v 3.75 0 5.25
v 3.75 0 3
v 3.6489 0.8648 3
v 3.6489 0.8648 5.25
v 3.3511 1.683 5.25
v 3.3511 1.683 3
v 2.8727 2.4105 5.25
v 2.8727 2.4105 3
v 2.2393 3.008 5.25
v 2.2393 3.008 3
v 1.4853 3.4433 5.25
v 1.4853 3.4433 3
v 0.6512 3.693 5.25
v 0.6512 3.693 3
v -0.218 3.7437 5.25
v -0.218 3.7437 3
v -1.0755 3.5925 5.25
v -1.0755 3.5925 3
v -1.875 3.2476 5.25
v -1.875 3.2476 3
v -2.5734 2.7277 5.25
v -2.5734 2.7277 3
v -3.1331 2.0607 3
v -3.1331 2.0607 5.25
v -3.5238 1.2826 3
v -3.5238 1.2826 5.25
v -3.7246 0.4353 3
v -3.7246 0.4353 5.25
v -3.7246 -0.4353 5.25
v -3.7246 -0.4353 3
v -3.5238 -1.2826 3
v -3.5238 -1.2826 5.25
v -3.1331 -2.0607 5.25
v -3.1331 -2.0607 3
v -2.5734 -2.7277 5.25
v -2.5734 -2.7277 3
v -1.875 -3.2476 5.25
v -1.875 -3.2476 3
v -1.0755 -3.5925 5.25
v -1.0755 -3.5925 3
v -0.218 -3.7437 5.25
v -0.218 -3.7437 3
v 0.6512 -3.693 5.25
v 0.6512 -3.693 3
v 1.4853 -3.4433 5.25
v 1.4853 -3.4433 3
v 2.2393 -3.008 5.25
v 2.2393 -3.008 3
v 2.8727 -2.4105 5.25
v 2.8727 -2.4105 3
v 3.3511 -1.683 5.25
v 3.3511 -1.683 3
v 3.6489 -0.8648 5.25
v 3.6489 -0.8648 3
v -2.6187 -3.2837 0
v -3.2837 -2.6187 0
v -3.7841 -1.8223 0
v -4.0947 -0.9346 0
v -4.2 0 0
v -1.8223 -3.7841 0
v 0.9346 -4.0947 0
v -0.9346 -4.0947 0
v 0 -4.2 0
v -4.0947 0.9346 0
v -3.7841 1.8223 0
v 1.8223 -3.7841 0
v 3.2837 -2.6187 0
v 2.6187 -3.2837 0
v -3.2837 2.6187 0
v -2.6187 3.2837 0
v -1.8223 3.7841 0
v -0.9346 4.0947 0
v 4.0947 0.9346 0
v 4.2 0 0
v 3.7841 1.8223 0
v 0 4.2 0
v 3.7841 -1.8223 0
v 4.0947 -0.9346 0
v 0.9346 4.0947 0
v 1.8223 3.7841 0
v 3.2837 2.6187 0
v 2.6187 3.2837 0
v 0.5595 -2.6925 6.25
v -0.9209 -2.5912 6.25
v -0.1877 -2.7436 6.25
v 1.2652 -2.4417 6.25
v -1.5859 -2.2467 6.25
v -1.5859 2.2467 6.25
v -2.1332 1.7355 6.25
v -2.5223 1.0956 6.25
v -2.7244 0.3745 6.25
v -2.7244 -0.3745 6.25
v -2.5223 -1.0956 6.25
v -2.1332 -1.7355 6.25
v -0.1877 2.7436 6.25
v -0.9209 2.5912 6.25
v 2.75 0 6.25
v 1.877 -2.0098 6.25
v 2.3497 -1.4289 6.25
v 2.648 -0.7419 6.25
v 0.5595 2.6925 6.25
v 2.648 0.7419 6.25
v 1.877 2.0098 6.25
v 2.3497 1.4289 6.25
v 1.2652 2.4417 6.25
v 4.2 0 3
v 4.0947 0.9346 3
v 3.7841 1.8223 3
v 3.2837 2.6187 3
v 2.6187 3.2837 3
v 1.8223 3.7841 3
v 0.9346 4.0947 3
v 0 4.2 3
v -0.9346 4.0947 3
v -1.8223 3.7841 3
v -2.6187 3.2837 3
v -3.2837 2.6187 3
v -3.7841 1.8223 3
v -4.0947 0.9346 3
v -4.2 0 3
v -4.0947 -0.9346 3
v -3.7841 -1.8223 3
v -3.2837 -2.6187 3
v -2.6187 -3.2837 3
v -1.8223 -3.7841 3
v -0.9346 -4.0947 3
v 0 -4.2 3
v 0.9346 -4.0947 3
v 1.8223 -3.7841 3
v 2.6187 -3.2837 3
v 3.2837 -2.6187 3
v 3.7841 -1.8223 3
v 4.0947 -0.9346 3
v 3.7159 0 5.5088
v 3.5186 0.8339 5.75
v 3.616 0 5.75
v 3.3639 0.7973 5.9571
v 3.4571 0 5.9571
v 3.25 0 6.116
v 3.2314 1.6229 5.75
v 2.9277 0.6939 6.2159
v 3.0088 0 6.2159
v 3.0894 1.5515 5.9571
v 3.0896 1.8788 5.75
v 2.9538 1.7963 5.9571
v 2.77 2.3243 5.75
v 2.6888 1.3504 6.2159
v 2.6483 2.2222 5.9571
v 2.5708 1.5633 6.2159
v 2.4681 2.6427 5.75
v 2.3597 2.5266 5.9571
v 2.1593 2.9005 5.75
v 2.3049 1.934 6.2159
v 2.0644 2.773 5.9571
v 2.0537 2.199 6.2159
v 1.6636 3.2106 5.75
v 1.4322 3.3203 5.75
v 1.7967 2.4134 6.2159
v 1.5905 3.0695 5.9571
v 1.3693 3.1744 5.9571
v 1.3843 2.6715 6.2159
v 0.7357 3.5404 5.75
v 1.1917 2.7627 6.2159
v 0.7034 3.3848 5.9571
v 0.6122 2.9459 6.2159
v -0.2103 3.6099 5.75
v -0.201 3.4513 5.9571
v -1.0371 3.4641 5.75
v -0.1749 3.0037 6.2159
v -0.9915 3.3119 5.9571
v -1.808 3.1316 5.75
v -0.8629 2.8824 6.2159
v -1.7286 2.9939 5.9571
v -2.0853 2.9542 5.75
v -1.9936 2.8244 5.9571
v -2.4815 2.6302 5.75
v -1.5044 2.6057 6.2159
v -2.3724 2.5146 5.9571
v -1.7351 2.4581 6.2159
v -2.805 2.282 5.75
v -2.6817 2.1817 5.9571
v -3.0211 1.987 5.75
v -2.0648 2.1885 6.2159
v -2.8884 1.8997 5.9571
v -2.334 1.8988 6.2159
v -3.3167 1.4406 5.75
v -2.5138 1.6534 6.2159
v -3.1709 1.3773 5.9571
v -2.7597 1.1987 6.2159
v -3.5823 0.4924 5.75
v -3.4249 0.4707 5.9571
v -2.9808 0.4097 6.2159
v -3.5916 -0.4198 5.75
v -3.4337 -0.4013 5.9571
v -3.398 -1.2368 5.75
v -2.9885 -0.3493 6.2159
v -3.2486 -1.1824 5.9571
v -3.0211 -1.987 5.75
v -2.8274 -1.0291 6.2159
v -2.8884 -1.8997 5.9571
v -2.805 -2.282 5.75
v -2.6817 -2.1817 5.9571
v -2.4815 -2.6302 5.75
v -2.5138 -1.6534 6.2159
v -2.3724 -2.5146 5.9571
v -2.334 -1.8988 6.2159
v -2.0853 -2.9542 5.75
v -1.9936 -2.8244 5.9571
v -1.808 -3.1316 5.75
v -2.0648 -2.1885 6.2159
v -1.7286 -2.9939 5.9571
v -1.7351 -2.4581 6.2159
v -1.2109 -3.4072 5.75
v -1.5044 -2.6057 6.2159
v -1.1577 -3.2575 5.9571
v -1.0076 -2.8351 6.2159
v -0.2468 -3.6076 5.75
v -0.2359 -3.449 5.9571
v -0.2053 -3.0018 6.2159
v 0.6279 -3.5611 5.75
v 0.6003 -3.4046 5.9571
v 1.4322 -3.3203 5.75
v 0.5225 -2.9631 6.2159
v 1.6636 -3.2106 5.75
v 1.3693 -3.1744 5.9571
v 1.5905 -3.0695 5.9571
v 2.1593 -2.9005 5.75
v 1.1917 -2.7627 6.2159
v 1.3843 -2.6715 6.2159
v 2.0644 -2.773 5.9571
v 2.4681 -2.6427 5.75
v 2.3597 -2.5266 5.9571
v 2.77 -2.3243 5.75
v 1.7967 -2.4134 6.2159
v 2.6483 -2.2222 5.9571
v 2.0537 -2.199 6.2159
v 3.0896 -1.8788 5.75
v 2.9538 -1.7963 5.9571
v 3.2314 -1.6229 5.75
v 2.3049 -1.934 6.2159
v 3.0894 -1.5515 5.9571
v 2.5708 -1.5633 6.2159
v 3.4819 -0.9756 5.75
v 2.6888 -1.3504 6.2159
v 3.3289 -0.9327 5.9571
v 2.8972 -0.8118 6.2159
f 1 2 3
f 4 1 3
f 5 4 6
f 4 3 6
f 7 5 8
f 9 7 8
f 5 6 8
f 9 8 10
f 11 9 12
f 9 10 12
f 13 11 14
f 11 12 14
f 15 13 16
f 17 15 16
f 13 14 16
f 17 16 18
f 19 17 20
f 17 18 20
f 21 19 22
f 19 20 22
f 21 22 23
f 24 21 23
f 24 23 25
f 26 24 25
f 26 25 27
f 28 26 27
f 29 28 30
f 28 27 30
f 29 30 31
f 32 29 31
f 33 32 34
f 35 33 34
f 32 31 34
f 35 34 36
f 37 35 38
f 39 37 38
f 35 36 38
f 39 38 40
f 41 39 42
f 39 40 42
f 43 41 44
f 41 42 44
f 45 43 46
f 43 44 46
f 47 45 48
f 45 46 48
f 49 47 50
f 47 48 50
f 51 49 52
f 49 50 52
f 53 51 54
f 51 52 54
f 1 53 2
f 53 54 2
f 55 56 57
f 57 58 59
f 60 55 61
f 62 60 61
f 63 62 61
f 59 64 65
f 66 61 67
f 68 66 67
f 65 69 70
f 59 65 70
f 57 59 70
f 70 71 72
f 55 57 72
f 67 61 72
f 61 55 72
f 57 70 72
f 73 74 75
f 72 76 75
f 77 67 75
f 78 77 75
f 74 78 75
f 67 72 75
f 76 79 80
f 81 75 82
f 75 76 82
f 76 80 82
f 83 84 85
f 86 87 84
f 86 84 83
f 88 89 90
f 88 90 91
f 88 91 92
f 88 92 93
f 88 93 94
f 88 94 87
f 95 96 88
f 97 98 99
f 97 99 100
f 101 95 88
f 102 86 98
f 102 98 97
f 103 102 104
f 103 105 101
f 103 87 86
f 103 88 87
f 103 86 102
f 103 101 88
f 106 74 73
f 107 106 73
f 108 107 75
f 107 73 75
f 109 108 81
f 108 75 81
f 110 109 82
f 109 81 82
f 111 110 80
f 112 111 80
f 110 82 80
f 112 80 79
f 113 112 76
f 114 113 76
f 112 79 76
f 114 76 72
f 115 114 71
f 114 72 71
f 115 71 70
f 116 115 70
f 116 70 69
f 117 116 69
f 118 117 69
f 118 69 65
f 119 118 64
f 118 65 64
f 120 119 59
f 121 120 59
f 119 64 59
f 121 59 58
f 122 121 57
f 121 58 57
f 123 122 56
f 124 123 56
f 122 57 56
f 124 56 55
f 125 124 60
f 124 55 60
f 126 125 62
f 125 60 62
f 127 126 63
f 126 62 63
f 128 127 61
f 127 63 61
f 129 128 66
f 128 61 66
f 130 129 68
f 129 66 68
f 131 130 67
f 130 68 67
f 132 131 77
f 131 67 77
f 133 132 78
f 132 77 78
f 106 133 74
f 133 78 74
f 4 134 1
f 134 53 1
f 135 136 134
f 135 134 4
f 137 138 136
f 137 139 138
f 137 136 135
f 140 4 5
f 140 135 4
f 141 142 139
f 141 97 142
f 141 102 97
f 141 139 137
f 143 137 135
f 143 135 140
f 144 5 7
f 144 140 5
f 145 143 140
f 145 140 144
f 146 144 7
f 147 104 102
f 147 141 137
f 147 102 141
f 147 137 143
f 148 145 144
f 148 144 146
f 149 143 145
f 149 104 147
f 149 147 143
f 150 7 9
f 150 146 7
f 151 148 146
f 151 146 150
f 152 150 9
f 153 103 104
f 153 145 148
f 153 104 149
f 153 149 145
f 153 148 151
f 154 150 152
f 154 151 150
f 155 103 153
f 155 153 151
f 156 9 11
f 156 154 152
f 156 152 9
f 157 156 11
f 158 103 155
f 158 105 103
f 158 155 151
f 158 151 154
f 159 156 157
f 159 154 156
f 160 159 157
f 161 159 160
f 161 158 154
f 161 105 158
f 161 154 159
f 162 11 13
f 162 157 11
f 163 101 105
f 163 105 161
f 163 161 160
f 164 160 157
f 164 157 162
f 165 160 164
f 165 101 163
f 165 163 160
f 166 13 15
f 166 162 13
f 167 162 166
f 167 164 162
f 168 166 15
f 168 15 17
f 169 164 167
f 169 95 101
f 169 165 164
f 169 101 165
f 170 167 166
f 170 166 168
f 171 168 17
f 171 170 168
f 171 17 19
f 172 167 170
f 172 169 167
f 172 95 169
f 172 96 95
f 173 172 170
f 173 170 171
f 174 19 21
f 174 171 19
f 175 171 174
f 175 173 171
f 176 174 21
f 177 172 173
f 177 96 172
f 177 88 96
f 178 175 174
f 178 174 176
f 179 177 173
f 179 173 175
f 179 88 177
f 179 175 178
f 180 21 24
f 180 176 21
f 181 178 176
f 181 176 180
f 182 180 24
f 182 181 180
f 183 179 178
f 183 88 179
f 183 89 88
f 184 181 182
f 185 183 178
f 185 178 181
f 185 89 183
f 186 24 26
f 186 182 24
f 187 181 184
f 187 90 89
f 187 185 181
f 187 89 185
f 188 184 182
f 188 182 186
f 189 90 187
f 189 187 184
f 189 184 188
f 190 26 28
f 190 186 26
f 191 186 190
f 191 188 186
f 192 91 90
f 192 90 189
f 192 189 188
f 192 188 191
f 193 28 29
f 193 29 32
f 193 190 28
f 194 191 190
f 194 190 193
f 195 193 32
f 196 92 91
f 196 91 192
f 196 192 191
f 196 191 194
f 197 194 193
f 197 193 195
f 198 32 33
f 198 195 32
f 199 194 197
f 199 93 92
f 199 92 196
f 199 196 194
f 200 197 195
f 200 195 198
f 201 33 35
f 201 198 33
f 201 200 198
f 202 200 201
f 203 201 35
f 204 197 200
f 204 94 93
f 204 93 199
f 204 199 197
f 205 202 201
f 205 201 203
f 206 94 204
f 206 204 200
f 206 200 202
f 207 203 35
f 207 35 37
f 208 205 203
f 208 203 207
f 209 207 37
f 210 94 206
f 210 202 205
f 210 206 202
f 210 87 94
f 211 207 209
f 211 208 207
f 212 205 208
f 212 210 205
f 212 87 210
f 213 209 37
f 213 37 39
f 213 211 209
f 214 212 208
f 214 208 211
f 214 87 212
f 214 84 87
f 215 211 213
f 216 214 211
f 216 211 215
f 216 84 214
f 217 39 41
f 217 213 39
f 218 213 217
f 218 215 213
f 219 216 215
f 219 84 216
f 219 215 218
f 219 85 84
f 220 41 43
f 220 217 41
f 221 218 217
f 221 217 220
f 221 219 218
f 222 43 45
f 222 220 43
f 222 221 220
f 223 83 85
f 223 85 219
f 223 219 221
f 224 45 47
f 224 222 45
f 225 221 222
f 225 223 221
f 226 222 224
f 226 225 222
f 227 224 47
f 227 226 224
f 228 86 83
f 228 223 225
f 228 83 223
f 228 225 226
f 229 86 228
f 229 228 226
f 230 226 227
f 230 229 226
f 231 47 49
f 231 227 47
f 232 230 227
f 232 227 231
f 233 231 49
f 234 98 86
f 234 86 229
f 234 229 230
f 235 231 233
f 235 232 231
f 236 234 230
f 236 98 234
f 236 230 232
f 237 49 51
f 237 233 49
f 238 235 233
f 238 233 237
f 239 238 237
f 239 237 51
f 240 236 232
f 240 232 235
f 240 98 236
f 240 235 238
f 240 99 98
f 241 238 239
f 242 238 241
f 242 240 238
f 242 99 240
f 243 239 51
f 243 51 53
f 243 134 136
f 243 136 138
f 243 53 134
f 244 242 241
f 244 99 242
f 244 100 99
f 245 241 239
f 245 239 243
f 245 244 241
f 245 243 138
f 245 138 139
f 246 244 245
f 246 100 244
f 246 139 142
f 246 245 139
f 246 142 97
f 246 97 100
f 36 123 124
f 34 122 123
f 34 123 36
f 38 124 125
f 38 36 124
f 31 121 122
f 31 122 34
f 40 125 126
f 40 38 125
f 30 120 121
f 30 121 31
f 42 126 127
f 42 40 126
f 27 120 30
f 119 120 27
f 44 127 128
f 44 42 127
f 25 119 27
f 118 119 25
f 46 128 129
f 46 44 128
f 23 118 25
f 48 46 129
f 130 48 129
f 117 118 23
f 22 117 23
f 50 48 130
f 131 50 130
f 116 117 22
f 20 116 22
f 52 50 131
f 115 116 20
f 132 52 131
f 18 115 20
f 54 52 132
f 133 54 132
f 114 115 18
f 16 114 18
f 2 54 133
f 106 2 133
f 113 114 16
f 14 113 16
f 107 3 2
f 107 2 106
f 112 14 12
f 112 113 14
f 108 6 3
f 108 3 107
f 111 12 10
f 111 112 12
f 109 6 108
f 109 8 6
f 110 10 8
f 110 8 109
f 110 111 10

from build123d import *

# Parameters (mm, degrees)
SKETCH_R     = 4.2
PAD_DEPTH    = 3
SKETCH001_R  = 3.75
PAD001_DEPTH = 3.25
FILLET_R     = 1


with BuildPart() as part:
    # Sketch → Pad (new body)
    with BuildSketch(Plane.XY):
        Circle(SKETCH_R)
    extrude(amount=PAD_DEPTH)

    # Sketch001 (on Face3 of Pad) → Pad001 (join)
    with BuildSketch(Plane.XY.offset(3)):
        Circle(SKETCH001_R)
    extrude(amount=PAD001_DEPTH)

    # Fillet
    fillet_edges = [part.edges().sort_by_distance(p)[0] for p in [
        (-3.75, 0, 6.25),
    ]]
    fillet(fillet_edges, radius=FILLET_R)


solid = part.part
